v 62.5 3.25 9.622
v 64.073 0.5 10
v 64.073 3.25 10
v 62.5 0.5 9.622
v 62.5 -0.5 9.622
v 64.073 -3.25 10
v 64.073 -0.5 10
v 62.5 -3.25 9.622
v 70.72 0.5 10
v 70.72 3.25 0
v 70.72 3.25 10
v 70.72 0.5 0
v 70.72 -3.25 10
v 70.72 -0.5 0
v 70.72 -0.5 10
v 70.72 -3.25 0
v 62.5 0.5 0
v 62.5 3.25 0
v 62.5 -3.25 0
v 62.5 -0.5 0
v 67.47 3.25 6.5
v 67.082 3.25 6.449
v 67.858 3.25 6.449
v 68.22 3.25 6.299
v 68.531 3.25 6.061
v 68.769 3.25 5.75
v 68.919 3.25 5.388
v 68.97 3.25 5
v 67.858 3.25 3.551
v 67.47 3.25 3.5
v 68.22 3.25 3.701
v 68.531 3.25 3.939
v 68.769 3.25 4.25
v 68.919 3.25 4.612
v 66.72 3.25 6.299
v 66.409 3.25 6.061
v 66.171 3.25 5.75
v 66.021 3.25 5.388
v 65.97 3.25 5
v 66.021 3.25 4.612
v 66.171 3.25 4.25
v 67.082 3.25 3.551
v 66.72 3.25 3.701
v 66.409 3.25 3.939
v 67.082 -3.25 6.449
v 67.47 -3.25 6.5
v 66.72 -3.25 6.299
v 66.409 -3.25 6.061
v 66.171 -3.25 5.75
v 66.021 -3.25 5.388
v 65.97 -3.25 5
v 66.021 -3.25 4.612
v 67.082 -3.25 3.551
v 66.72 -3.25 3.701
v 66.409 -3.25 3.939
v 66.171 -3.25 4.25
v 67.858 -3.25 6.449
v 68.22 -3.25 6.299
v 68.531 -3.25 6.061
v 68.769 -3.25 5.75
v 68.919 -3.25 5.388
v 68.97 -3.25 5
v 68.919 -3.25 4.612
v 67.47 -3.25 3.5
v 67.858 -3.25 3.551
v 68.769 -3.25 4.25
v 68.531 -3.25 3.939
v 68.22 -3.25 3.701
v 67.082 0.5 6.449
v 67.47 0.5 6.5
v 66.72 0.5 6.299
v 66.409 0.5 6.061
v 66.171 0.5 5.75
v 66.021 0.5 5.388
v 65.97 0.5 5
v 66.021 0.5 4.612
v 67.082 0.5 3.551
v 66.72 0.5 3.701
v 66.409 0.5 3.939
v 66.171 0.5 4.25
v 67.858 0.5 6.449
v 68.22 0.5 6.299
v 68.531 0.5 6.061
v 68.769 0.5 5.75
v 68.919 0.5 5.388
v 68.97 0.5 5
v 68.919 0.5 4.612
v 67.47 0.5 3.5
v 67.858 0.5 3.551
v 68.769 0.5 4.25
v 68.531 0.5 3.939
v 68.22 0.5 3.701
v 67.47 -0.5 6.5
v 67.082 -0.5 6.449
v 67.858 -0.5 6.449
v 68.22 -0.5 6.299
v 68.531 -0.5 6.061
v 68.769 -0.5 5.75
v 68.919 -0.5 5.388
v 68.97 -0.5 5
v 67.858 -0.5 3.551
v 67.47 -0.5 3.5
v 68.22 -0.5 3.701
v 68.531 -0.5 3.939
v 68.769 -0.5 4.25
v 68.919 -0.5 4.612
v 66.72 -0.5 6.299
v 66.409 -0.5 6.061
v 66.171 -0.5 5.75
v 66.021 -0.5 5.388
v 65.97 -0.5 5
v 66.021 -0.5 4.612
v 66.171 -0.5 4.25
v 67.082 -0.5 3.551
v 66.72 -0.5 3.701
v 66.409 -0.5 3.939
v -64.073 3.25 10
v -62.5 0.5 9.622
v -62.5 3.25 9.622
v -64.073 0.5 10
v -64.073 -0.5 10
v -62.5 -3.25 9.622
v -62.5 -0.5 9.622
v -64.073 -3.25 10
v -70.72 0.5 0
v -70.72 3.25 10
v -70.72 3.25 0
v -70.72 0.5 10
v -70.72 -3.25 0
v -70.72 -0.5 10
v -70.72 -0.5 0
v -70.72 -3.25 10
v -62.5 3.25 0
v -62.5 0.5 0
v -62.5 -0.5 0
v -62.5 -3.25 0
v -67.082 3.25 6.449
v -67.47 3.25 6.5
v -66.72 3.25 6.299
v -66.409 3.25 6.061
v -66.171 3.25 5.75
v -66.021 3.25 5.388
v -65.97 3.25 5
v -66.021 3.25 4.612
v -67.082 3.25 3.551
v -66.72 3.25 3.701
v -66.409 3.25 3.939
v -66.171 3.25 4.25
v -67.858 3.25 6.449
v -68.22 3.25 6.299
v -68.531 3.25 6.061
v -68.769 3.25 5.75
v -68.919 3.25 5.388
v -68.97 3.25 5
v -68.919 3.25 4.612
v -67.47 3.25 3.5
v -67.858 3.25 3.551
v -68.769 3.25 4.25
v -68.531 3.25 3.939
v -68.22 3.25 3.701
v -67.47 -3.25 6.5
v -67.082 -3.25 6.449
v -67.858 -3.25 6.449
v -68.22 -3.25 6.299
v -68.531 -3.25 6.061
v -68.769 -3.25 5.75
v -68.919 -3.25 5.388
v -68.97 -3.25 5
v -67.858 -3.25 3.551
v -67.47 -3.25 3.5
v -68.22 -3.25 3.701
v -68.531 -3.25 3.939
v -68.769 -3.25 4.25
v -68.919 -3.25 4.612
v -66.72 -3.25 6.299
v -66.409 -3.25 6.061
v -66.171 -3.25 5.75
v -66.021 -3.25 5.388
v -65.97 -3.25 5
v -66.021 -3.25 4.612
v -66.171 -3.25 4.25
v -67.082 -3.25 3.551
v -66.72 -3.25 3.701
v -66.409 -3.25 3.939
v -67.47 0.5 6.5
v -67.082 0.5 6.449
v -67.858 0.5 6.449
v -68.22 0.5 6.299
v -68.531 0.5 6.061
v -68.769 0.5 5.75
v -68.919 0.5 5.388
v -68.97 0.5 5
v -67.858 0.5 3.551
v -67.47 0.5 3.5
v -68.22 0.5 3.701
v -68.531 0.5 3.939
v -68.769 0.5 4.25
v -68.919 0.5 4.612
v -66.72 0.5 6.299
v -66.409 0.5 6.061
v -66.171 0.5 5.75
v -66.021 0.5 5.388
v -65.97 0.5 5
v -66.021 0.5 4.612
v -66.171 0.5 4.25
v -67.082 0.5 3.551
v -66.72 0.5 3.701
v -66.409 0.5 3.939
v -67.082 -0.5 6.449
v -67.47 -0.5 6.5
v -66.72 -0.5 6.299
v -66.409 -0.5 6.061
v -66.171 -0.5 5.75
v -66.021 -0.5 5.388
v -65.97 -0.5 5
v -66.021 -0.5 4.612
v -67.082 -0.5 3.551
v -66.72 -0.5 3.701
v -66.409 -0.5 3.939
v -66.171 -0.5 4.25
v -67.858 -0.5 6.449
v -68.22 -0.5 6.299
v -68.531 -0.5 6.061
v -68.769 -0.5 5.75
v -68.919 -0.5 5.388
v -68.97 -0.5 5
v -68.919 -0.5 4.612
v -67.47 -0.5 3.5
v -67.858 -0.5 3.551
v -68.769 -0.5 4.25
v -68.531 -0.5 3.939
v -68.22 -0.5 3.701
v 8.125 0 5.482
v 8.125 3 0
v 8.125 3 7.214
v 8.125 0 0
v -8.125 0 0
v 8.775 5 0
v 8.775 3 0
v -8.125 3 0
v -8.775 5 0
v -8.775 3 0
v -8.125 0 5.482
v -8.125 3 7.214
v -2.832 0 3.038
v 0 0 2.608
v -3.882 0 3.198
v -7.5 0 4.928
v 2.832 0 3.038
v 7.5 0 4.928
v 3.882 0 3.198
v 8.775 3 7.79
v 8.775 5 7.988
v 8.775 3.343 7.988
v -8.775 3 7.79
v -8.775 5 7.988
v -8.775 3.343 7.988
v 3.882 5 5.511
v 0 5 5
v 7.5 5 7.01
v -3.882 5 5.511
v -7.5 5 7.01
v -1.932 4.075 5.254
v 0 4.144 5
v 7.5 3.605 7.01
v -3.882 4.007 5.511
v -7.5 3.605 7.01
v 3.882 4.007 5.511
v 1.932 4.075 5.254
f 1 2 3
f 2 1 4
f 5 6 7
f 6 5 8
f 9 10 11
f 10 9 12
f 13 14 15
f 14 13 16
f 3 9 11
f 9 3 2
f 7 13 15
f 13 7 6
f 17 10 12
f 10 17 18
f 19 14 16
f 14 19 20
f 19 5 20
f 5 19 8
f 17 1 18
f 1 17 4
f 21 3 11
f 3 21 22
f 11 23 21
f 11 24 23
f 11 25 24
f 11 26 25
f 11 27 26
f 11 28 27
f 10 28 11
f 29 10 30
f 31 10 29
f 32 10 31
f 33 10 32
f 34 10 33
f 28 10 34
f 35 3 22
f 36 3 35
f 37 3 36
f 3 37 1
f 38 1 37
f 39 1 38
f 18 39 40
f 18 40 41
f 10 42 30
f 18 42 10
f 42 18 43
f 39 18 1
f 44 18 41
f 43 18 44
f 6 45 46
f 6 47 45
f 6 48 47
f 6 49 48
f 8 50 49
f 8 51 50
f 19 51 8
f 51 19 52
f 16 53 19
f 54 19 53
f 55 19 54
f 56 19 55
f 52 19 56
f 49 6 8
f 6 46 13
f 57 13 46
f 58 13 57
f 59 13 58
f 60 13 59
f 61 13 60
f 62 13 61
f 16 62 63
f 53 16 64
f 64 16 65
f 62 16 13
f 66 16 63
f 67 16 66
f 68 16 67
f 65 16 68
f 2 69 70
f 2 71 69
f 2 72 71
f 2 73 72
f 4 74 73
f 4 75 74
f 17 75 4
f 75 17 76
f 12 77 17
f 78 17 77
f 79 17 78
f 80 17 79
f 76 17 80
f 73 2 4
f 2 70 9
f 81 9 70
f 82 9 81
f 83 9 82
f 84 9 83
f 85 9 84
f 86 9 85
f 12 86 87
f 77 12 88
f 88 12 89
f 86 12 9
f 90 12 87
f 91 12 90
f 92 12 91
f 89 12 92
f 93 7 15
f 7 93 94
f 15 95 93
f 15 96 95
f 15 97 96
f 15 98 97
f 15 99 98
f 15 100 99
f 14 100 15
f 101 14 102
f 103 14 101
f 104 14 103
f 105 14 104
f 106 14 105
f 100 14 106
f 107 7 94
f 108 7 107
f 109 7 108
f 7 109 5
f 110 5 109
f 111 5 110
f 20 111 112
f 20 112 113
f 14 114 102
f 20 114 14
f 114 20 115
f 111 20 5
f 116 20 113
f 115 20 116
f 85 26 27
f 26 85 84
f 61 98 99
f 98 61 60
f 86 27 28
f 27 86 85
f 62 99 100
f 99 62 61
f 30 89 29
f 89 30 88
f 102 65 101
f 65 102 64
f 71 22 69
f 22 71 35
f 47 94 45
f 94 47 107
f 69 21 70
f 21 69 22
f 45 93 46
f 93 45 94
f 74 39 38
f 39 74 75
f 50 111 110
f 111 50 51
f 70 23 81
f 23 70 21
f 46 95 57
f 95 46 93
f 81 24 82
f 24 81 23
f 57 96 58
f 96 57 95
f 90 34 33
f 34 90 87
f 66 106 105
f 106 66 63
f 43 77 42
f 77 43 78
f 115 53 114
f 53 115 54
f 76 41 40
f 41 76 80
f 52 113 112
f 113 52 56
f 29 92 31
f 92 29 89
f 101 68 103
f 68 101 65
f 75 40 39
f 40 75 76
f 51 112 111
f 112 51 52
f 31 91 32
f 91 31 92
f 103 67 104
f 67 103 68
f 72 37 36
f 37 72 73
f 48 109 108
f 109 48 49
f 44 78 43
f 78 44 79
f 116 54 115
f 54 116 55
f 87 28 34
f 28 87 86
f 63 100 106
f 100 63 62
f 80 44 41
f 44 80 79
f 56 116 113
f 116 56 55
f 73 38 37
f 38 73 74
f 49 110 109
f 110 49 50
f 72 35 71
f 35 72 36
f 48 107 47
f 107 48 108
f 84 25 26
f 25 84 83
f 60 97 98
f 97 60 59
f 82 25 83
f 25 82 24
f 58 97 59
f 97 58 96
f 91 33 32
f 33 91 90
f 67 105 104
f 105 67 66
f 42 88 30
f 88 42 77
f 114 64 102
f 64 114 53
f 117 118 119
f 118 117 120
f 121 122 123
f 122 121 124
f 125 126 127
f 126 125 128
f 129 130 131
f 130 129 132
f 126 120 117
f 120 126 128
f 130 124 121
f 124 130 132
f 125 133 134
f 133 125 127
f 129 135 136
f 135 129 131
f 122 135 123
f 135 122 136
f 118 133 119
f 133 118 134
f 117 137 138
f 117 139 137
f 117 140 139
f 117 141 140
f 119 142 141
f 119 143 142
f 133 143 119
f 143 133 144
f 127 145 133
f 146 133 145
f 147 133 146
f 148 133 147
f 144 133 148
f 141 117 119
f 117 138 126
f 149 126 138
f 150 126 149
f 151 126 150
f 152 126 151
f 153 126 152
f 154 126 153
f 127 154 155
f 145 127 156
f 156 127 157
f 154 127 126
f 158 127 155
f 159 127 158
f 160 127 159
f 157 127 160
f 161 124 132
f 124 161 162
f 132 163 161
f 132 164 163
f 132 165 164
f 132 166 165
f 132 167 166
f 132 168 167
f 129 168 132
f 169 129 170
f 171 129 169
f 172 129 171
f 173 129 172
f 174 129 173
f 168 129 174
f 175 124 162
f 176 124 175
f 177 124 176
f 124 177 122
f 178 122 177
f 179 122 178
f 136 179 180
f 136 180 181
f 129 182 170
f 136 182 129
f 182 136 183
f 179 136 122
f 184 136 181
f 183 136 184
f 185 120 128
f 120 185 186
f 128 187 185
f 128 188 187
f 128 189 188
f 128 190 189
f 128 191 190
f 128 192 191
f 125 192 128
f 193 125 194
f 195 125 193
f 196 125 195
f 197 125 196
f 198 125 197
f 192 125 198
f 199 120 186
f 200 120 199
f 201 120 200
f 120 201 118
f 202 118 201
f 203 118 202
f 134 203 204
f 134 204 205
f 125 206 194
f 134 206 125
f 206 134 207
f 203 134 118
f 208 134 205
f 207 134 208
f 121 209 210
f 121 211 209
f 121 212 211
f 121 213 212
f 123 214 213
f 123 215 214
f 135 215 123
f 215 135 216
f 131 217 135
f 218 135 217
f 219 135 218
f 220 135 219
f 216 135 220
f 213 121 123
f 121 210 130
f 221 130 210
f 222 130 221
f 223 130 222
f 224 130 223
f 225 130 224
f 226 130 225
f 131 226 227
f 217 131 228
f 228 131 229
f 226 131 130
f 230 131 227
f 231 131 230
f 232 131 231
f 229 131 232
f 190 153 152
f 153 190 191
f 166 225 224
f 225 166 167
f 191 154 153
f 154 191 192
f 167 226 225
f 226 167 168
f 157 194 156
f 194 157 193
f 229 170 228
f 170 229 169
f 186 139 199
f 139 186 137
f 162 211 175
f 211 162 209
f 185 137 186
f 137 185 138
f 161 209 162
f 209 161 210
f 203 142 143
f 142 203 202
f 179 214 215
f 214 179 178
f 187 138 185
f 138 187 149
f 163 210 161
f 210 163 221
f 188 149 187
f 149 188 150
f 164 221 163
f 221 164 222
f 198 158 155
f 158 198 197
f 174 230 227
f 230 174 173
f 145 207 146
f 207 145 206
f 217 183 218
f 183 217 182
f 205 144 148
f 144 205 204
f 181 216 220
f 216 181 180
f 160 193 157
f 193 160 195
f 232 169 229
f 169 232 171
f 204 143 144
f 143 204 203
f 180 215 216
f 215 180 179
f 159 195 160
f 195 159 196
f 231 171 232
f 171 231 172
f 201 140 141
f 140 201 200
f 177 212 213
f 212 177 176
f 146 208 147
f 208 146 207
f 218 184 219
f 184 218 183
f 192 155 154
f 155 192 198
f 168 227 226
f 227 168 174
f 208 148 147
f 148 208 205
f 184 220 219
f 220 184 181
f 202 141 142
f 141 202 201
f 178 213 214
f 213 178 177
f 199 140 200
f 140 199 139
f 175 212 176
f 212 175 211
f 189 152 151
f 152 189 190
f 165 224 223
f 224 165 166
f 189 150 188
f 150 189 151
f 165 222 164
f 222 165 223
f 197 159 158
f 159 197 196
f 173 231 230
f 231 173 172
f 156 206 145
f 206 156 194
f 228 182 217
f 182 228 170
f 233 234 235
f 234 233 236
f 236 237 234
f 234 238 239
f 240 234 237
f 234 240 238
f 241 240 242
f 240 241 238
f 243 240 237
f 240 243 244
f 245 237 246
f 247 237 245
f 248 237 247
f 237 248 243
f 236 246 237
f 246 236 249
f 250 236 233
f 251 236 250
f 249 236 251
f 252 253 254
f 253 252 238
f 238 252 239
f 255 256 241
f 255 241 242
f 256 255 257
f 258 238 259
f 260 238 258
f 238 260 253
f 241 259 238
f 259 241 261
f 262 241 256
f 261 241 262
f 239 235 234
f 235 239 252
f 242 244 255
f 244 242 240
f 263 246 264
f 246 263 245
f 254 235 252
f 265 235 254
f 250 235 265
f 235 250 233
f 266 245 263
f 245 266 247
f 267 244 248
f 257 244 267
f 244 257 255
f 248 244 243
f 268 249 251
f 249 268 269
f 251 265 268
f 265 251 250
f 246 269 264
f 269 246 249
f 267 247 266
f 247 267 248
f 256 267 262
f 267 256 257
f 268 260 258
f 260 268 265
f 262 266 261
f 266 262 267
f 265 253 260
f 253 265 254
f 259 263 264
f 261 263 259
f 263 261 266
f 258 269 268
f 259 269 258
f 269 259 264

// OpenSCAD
lensWidth = 54;
lensHeight = 36;

parameter_a = 1.5;
parameter_b = 1.5;
parameter_c = -11.95;
parameter_d = 0.22;

parameter_e = 9;
parameter_f = 47;
parameter_g = 17;
parameter_h = 1.3;

parameter_i = 100;

// Right lens
module lens() {
	intersection() {
		linear_extrude(height=15)
			import("RightLensFrontView.dxf",$fn=250);
		translate([0,20,0])
			rotate( [90,0,0] )
				linear_extrude(height=50)
					import("RightLensTopView.dxf",$fn=250);
	}
}

module lens_case() {
  translate([lensWidth/2, (lensHeight+parameter_a*2)/lensHeight * -(parameter_c + lensHeight/2), 0]) // TODO: Y is probably wrong
    difference() {
      union() {
        linear_extrude(height = 20)
          scale([(lensWidth+parameter_a*2)/lensWidth,(lensHeight+parameter_a*2)/lensHeight])
            translate([-lensWidth/2, parameter_c + lensHeight/2, 0])
              import("RightLensFrontView.dxf",$fn=250);
      }
      translate([0, 0, -1])
        linear_extrude(height=100)
          scale([(lensWidth-parameter_b*2)/lensWidth,(lensHeight-parameter_b*2)/lensHeight])
            translate([-lensWidth/2, parameter_c + lensHeight/2, 0])
              import("RightLensFrontView.dxf",$fn=250);	
    }
}

module lens_assembly() {
  intersection() {
    difference() {
      union() {
        lens_case();
        translate([lensWidth, -6.5/2, 0])
          cube([parameter_a + parameter_d + 6.5, 6.5, 10]);
      }

      translate([0, 0, 1.5]) // TODO: Parameterize
        scale([1, 1, 1.2]) // TODO: Parameterize
          lens();

      translate([lensWidth/2, -1/2, -1])
        cube([lensWidth, 1, 10 + 2]);

      translate([lensWidth + parameter_a + parameter_d + 6.5/2, 0, 5])
        rotate([90, 0, 0])
          cylinder(d = 3, h = 25, $fn = 24, center = true);

      intersection() {
        translate([(lensWidth - parameter_e + parameter_a + parameter_d)/2 + parameter_e, 20, 10 + sqrt(pow(parameter_i, 2) - pow((lensWidth - parameter_e + parameter_a + parameter_d)/2, 2))]) // TODO: Parameterize
          rotate([90, 0, 0])
            cylinder(r = parameter_i, h = 100, $fn=120);

        translate([parameter_e, -50, 0])
          cube([lensWidth - parameter_e + parameter_a + parameter_d, 100, 100]);
      }
    }

    // TODO: Parameterize
    union() {
      translate([-10, -10 + 2, -30/2 + 10 + 5])
        rotate([0, 90, 0])
          cylinder(d = 30, h = 20);
      translate([-10, -50, 0])
        cube([100, 100, 10]);
    }

  }
}

module bridge() {
	difference() {
		union() {
			translate([0,4,9/2])
				cube([parameter_g - parameter_a/2, 4, 9],center=true);
			translate([0,6,9/2])
				cube([parameter_g - parameter_a/2 + parameter_h, 2, 9],center=true);
		}

		union() {
			translate([0,-10,15-2])
				rotate([-60,0,0])
					cylinder(r=15,h=20,$fn=24);

			translate([0,15,22-2])
				rotate([90,0,0])
					cylinder(r=15,h=20,$fn=24);
		}
	}
}

difference() {
	// Raw Frames
	union() {
    for (m = [0, 1])
      mirror([m, 0, 0])
        translate([parameter_g/2,0,0])
          lens_assembly();

		// Bridge
    translate([0, -2, 0])
      bridge();
	}
}
